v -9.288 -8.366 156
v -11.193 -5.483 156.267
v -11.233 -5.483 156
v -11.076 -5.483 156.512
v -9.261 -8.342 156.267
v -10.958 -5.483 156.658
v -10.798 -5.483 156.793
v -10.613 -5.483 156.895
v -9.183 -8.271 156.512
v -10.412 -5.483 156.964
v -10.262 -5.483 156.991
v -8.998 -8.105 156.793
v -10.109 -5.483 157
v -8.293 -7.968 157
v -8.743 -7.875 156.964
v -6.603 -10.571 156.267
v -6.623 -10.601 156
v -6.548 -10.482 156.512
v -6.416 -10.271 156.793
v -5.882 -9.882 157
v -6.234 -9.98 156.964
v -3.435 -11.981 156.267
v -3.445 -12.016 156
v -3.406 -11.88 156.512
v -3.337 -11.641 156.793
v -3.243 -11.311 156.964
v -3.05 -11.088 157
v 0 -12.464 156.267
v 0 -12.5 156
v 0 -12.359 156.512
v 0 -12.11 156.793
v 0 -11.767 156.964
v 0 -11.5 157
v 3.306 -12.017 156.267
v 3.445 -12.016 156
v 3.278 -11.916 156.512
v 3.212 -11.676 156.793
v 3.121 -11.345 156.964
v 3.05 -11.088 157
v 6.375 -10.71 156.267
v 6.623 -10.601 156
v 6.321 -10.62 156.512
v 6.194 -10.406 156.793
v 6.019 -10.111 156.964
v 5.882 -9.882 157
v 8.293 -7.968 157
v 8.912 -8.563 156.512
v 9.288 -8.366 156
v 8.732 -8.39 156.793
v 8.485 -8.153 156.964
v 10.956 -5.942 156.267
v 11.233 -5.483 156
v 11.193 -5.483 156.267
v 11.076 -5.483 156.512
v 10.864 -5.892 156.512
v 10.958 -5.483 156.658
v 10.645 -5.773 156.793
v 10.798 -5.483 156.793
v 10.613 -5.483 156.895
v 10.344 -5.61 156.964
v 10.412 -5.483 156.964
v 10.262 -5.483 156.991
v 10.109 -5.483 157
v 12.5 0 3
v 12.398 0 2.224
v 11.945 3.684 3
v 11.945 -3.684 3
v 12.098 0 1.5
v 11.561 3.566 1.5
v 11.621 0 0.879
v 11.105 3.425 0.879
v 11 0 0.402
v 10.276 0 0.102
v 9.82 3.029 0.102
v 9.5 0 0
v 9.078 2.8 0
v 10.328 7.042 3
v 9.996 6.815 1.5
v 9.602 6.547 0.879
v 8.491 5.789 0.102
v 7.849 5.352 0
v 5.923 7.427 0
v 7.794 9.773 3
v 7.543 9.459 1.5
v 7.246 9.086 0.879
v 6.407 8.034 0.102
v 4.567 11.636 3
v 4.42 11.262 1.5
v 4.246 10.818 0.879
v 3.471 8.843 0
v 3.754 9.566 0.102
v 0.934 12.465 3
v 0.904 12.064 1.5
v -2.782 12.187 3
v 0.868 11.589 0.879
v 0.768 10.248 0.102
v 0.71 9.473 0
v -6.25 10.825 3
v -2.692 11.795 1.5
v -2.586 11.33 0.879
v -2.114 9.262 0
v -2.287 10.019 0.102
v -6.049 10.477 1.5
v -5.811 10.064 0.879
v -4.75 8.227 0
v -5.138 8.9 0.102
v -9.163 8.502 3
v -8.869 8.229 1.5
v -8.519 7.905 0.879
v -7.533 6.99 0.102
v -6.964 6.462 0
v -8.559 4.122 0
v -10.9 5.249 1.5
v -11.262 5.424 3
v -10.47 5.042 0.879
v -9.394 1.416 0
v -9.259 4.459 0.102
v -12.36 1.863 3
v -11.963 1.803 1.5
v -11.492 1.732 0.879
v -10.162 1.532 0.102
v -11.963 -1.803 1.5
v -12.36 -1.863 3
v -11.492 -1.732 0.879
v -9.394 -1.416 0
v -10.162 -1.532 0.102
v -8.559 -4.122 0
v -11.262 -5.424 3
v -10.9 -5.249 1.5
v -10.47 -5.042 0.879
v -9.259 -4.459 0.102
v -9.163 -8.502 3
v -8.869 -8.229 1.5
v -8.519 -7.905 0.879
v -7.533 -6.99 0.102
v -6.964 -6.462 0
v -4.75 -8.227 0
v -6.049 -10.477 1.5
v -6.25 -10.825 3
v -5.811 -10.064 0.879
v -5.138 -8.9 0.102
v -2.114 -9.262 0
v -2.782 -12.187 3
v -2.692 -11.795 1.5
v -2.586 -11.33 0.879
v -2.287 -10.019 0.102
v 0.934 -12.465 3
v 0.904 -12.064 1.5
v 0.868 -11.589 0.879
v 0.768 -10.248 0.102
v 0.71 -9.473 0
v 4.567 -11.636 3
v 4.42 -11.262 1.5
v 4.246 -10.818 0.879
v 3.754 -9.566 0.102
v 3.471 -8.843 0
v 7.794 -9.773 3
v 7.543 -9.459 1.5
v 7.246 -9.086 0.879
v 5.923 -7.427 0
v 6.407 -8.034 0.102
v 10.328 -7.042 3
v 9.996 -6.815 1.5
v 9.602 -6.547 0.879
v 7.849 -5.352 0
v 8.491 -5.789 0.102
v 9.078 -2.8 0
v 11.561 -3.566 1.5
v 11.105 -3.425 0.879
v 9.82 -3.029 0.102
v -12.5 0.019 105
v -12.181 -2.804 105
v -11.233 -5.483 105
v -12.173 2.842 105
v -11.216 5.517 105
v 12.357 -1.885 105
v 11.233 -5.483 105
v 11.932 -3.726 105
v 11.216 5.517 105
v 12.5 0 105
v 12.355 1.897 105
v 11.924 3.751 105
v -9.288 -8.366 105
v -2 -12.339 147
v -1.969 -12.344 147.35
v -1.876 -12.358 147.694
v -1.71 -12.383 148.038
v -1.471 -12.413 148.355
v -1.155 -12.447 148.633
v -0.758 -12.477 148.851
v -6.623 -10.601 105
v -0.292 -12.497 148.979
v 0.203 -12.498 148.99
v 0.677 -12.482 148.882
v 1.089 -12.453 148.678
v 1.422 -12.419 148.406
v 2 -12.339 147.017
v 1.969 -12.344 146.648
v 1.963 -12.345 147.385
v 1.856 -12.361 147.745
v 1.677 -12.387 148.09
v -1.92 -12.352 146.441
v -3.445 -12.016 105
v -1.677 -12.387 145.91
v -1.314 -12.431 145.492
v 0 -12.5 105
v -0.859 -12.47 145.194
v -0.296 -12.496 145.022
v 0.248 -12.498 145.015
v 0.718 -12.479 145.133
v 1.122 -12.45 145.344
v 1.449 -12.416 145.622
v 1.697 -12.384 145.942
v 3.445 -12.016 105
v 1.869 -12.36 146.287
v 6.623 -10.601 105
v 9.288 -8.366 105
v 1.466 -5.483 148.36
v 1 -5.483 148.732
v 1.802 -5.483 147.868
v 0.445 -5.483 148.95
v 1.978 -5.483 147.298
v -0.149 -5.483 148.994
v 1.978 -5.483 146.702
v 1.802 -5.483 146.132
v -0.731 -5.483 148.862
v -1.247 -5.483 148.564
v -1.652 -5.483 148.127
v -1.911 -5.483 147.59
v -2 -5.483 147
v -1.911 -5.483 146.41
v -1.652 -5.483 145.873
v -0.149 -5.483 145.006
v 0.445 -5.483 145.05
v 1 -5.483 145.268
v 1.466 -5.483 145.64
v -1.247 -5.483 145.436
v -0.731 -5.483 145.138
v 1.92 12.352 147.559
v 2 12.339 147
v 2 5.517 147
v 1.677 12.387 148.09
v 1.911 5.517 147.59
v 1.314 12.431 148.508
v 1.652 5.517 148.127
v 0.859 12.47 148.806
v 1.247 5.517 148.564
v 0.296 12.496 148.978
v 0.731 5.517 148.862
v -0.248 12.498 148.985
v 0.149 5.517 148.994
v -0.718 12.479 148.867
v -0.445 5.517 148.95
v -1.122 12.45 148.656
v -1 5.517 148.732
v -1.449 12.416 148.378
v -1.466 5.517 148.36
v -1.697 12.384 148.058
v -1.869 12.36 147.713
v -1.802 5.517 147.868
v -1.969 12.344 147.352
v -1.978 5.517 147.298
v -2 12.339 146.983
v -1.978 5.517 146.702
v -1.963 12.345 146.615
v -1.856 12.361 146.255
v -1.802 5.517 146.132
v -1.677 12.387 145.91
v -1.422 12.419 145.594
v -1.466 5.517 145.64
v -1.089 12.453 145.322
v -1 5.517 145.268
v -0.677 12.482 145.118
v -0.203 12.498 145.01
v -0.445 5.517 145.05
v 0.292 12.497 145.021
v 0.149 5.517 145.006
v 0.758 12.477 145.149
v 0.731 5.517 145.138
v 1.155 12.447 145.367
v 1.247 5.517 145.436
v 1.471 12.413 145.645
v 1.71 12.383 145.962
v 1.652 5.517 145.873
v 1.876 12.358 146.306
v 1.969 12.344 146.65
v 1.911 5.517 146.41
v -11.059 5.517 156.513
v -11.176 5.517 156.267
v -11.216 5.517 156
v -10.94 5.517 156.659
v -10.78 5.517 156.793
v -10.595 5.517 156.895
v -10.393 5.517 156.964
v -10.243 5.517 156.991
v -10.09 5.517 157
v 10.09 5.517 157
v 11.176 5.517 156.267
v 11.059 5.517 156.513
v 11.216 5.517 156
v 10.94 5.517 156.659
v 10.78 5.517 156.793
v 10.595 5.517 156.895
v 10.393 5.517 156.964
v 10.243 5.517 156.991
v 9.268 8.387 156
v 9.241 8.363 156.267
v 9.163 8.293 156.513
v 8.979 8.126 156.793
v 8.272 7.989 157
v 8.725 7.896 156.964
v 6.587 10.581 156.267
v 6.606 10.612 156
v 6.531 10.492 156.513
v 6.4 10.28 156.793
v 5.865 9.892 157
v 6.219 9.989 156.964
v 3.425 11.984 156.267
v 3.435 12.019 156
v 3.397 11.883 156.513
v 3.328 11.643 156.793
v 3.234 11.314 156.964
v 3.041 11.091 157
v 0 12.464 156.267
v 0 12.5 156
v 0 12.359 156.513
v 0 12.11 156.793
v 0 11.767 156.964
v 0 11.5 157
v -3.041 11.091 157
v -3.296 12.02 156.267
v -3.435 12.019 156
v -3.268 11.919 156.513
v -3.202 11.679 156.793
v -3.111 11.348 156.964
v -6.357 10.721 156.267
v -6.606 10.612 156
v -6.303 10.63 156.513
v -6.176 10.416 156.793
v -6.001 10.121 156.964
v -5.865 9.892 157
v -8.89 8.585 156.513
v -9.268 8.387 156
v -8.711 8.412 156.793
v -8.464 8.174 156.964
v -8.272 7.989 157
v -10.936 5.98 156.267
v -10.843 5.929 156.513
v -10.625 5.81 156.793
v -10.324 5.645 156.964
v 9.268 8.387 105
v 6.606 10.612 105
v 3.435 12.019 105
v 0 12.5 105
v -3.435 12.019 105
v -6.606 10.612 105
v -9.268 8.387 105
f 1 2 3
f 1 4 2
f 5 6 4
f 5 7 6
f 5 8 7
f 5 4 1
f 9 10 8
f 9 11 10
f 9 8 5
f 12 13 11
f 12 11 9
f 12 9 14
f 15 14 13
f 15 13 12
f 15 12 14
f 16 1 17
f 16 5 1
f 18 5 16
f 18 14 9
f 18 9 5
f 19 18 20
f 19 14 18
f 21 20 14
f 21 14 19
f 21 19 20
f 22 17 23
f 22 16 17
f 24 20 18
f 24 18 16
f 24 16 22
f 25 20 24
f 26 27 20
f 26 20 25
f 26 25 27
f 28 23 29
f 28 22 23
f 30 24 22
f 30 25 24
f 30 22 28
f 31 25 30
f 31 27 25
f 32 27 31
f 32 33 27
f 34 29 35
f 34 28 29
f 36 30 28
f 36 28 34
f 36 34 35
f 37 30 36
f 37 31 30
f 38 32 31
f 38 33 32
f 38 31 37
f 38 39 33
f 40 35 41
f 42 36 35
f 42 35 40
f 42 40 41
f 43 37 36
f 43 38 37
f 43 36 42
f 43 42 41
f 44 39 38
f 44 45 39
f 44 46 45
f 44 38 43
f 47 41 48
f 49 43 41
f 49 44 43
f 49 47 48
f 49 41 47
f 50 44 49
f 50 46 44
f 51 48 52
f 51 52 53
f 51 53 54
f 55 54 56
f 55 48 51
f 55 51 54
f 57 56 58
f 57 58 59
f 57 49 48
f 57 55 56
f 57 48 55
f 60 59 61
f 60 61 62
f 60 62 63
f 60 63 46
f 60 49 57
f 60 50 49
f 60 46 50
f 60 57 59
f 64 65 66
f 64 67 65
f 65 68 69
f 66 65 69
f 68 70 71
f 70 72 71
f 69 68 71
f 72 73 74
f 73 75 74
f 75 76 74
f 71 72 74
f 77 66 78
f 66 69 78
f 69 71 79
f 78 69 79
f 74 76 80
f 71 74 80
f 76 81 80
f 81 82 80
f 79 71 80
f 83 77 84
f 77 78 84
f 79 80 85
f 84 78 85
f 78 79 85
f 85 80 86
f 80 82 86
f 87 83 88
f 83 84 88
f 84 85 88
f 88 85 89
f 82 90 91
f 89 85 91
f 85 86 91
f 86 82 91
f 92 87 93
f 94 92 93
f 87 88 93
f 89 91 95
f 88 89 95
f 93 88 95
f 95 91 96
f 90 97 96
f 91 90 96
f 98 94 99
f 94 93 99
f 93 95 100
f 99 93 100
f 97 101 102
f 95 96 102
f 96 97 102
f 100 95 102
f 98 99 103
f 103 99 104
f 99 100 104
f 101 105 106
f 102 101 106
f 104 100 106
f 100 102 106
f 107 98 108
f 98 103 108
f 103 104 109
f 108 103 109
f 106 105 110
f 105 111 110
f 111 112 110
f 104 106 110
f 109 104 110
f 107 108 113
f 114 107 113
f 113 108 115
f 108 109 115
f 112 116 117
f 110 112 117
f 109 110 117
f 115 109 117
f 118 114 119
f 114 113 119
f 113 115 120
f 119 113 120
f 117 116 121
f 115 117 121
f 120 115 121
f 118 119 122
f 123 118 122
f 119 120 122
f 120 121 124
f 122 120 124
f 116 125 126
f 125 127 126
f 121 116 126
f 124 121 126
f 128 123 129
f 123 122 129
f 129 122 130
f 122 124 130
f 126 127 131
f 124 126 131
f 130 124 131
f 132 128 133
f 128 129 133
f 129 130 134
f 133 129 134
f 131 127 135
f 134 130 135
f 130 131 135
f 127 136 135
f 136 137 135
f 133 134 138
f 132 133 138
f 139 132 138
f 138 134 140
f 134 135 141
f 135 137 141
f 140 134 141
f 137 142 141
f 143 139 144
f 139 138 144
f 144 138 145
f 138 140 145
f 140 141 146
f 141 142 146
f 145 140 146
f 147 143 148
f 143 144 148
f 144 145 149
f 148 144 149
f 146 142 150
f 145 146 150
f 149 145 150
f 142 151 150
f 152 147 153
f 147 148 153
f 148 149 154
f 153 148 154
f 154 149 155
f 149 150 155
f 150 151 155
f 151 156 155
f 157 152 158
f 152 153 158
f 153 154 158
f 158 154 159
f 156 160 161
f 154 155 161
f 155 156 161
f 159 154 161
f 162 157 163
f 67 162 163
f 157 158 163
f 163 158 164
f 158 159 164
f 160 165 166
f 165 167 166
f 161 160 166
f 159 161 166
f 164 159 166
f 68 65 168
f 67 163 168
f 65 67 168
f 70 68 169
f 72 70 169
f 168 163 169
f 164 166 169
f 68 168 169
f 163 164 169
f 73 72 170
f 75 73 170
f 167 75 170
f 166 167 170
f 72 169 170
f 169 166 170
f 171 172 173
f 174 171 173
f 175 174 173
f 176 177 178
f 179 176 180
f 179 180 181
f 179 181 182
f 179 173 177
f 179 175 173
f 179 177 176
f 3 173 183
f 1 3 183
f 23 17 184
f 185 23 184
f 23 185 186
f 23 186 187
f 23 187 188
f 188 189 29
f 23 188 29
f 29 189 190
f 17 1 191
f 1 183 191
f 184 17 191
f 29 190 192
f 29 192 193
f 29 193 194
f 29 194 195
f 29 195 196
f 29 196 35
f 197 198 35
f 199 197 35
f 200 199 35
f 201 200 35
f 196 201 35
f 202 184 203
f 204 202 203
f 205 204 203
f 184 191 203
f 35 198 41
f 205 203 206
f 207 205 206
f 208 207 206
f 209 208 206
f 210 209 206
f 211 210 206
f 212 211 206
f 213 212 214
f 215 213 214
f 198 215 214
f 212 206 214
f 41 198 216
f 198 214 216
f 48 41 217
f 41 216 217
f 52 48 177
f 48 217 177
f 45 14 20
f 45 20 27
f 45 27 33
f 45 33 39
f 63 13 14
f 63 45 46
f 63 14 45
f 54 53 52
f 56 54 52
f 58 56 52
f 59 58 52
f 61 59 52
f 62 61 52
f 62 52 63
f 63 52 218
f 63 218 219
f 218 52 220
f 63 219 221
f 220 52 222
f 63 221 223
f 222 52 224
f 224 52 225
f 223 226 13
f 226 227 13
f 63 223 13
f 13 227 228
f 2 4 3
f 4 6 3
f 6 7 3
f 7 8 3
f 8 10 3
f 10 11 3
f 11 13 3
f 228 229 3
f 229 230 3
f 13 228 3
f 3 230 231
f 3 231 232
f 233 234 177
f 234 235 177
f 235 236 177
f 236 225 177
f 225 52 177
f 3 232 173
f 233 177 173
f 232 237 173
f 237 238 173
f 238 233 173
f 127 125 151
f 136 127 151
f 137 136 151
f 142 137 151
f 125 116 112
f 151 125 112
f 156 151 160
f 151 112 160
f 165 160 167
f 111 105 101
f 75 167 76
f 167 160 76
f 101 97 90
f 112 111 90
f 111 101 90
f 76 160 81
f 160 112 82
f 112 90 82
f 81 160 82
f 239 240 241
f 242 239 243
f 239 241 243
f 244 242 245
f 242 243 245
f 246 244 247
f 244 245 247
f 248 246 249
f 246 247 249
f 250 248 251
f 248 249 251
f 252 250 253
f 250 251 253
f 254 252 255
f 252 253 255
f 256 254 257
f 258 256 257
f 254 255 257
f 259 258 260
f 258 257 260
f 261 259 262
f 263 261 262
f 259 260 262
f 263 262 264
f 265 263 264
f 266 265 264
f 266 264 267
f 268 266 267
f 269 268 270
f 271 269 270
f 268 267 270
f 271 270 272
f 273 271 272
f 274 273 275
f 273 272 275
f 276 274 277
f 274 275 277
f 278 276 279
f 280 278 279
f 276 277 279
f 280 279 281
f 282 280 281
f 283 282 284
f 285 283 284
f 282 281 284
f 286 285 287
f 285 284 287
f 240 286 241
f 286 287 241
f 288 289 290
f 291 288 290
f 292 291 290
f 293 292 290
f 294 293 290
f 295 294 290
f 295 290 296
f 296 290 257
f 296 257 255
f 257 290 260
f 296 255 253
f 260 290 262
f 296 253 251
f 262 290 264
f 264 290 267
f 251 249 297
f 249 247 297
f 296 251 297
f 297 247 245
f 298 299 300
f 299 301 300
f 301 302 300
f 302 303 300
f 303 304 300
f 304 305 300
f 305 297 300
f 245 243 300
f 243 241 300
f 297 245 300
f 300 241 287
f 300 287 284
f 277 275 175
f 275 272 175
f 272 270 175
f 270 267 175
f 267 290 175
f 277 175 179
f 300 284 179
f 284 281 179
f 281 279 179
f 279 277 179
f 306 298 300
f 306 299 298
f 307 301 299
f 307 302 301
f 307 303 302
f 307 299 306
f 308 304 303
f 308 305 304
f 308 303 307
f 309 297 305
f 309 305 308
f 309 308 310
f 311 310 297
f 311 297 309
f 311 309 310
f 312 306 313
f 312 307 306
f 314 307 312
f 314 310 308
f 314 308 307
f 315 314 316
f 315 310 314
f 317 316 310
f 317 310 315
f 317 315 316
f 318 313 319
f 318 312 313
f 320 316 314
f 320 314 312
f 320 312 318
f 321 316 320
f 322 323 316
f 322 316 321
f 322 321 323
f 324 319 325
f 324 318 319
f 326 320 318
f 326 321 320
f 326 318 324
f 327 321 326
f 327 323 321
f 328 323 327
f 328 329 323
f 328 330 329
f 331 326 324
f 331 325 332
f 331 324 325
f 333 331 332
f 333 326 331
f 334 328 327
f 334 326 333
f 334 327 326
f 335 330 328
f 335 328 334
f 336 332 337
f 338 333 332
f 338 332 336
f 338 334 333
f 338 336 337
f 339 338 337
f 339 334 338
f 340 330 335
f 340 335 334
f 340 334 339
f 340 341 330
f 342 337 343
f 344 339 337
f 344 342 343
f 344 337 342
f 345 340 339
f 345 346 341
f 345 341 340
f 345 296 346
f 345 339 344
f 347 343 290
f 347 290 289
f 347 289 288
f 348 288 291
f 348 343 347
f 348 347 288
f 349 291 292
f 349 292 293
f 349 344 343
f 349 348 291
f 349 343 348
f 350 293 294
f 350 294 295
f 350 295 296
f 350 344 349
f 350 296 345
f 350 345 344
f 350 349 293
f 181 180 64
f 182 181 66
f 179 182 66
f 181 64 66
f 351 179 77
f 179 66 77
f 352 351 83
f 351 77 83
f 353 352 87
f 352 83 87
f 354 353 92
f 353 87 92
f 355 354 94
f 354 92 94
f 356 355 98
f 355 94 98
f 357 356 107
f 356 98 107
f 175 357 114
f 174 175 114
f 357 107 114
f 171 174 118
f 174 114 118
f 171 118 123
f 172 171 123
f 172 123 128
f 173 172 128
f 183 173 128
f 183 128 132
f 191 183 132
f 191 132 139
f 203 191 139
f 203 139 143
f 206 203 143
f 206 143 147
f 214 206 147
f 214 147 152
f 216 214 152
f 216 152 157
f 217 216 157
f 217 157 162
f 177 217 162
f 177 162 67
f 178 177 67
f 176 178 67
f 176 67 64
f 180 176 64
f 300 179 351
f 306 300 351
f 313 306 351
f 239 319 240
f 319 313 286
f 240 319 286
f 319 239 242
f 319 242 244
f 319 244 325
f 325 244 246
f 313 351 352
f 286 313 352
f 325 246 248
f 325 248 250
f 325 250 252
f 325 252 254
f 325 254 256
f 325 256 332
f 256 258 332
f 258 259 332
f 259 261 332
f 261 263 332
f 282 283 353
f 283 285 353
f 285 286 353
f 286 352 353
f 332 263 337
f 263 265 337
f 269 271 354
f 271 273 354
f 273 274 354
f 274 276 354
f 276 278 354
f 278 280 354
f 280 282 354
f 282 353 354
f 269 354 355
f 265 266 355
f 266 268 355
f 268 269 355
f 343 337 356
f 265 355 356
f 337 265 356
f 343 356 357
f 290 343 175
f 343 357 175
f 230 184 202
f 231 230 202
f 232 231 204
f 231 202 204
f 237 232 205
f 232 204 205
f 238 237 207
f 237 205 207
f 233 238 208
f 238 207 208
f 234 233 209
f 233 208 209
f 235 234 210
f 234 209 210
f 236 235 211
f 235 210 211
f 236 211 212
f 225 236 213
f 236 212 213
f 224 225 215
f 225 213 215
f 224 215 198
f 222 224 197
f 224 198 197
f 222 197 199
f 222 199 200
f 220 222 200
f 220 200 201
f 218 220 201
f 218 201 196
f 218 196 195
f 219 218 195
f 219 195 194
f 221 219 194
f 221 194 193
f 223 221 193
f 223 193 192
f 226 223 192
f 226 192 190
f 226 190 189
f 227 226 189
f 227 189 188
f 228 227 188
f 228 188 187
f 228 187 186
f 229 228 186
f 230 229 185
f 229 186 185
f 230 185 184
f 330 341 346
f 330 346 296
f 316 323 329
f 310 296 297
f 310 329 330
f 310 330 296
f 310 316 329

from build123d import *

# Parameters (mm, degrees)
F0_R     = 12.5
F1_DEPTH = 105
F3_DEPTH = 52
F4_R     = 3
F6_D     = 4
F6_DEPTH = 20
F6_TIP   = 1.2017212381
F7_D     = 4
F7_DEPTH = 20
F7_START = 11
F7_TIP   = 1.2017212381
F8_R     = 1


with BuildPart() as f1:
    # F0 (on Top) → F1 (new body)
    with BuildSketch(Plane.XY):
        Circle(F0_R)
    extrude(amount=F1_DEPTH)

    # F2 (on face) → F3 (join)
    with BuildSketch(Plane.XY.offset(105)):
        with BuildLine():
            Line((11.2334422785, -5.4826795069), (-11.2334422785, -5.4826795069))
            ThreePointArc((-11.2334422785, -5.4826795069), (0, -12.5), (11.2334422785, -5.4826795069))
        make_face()
        with BuildLine():
            ThreePointArc((11.2164688996, 5.5173204931), (0, 12.5), (-11.2164688996, 5.5173204931))
            Line((-11.2164688996, 5.5173204931), (11.2164688996, 5.5173204931))
        make_face()
    extrude(amount=F3_DEPTH)

    # F4
    f4_edges = [f1.edges().sort_by_distance(p)[0] for p in [
        (-12.5, 0, 0),
    ]]
    fillet(f4_edges, radius=F4_R)

    # F6 (one way)
    with BuildSketch(Plane.XZ.offset(-5.5173204931)):
        with Locations((0, 147)):
            Circle(F6_D / 2)
    extrude(amount=-F6_DEPTH, mode=Mode.SUBTRACT)
    with Locations(Plane.XZ.offset(-5.5173204931)):
        with Locations((0, 147)):
            with Locations((0, 0, -(F6_DEPTH + F6_TIP / 2))):  # 118° drill point
                Cone(0, F6_D / 2, F6_TIP, mode=Mode.SUBTRACT)

    # F7
    # its depths count from where the whole tool has entered the part; down to there all is cleared
    with Locations(Plane(origin=(0, 5.5173204931, 0), x_dir=(1, 0, 0), z_dir=(0, 1, 0)).offset(-F7_START)):
        with Locations((0, -147)):
            Hole(F7_D / 2, depth=F7_DEPTH)
            with Locations((0, 0, -(F7_DEPTH + F7_TIP / 2))):  # 118° drill point
                Cone(0, F7_D / 2, F7_TIP, mode=Mode.SUBTRACT)

    # F8
    f8_edges = [f1.edges().sort_by_distance(p)[0] for p in [
        (0, 12.5, 157),
        (0, -12.5, 157),
    ]]
    fillet(f8_edges, radius=F8_R)


solid = f1.part
